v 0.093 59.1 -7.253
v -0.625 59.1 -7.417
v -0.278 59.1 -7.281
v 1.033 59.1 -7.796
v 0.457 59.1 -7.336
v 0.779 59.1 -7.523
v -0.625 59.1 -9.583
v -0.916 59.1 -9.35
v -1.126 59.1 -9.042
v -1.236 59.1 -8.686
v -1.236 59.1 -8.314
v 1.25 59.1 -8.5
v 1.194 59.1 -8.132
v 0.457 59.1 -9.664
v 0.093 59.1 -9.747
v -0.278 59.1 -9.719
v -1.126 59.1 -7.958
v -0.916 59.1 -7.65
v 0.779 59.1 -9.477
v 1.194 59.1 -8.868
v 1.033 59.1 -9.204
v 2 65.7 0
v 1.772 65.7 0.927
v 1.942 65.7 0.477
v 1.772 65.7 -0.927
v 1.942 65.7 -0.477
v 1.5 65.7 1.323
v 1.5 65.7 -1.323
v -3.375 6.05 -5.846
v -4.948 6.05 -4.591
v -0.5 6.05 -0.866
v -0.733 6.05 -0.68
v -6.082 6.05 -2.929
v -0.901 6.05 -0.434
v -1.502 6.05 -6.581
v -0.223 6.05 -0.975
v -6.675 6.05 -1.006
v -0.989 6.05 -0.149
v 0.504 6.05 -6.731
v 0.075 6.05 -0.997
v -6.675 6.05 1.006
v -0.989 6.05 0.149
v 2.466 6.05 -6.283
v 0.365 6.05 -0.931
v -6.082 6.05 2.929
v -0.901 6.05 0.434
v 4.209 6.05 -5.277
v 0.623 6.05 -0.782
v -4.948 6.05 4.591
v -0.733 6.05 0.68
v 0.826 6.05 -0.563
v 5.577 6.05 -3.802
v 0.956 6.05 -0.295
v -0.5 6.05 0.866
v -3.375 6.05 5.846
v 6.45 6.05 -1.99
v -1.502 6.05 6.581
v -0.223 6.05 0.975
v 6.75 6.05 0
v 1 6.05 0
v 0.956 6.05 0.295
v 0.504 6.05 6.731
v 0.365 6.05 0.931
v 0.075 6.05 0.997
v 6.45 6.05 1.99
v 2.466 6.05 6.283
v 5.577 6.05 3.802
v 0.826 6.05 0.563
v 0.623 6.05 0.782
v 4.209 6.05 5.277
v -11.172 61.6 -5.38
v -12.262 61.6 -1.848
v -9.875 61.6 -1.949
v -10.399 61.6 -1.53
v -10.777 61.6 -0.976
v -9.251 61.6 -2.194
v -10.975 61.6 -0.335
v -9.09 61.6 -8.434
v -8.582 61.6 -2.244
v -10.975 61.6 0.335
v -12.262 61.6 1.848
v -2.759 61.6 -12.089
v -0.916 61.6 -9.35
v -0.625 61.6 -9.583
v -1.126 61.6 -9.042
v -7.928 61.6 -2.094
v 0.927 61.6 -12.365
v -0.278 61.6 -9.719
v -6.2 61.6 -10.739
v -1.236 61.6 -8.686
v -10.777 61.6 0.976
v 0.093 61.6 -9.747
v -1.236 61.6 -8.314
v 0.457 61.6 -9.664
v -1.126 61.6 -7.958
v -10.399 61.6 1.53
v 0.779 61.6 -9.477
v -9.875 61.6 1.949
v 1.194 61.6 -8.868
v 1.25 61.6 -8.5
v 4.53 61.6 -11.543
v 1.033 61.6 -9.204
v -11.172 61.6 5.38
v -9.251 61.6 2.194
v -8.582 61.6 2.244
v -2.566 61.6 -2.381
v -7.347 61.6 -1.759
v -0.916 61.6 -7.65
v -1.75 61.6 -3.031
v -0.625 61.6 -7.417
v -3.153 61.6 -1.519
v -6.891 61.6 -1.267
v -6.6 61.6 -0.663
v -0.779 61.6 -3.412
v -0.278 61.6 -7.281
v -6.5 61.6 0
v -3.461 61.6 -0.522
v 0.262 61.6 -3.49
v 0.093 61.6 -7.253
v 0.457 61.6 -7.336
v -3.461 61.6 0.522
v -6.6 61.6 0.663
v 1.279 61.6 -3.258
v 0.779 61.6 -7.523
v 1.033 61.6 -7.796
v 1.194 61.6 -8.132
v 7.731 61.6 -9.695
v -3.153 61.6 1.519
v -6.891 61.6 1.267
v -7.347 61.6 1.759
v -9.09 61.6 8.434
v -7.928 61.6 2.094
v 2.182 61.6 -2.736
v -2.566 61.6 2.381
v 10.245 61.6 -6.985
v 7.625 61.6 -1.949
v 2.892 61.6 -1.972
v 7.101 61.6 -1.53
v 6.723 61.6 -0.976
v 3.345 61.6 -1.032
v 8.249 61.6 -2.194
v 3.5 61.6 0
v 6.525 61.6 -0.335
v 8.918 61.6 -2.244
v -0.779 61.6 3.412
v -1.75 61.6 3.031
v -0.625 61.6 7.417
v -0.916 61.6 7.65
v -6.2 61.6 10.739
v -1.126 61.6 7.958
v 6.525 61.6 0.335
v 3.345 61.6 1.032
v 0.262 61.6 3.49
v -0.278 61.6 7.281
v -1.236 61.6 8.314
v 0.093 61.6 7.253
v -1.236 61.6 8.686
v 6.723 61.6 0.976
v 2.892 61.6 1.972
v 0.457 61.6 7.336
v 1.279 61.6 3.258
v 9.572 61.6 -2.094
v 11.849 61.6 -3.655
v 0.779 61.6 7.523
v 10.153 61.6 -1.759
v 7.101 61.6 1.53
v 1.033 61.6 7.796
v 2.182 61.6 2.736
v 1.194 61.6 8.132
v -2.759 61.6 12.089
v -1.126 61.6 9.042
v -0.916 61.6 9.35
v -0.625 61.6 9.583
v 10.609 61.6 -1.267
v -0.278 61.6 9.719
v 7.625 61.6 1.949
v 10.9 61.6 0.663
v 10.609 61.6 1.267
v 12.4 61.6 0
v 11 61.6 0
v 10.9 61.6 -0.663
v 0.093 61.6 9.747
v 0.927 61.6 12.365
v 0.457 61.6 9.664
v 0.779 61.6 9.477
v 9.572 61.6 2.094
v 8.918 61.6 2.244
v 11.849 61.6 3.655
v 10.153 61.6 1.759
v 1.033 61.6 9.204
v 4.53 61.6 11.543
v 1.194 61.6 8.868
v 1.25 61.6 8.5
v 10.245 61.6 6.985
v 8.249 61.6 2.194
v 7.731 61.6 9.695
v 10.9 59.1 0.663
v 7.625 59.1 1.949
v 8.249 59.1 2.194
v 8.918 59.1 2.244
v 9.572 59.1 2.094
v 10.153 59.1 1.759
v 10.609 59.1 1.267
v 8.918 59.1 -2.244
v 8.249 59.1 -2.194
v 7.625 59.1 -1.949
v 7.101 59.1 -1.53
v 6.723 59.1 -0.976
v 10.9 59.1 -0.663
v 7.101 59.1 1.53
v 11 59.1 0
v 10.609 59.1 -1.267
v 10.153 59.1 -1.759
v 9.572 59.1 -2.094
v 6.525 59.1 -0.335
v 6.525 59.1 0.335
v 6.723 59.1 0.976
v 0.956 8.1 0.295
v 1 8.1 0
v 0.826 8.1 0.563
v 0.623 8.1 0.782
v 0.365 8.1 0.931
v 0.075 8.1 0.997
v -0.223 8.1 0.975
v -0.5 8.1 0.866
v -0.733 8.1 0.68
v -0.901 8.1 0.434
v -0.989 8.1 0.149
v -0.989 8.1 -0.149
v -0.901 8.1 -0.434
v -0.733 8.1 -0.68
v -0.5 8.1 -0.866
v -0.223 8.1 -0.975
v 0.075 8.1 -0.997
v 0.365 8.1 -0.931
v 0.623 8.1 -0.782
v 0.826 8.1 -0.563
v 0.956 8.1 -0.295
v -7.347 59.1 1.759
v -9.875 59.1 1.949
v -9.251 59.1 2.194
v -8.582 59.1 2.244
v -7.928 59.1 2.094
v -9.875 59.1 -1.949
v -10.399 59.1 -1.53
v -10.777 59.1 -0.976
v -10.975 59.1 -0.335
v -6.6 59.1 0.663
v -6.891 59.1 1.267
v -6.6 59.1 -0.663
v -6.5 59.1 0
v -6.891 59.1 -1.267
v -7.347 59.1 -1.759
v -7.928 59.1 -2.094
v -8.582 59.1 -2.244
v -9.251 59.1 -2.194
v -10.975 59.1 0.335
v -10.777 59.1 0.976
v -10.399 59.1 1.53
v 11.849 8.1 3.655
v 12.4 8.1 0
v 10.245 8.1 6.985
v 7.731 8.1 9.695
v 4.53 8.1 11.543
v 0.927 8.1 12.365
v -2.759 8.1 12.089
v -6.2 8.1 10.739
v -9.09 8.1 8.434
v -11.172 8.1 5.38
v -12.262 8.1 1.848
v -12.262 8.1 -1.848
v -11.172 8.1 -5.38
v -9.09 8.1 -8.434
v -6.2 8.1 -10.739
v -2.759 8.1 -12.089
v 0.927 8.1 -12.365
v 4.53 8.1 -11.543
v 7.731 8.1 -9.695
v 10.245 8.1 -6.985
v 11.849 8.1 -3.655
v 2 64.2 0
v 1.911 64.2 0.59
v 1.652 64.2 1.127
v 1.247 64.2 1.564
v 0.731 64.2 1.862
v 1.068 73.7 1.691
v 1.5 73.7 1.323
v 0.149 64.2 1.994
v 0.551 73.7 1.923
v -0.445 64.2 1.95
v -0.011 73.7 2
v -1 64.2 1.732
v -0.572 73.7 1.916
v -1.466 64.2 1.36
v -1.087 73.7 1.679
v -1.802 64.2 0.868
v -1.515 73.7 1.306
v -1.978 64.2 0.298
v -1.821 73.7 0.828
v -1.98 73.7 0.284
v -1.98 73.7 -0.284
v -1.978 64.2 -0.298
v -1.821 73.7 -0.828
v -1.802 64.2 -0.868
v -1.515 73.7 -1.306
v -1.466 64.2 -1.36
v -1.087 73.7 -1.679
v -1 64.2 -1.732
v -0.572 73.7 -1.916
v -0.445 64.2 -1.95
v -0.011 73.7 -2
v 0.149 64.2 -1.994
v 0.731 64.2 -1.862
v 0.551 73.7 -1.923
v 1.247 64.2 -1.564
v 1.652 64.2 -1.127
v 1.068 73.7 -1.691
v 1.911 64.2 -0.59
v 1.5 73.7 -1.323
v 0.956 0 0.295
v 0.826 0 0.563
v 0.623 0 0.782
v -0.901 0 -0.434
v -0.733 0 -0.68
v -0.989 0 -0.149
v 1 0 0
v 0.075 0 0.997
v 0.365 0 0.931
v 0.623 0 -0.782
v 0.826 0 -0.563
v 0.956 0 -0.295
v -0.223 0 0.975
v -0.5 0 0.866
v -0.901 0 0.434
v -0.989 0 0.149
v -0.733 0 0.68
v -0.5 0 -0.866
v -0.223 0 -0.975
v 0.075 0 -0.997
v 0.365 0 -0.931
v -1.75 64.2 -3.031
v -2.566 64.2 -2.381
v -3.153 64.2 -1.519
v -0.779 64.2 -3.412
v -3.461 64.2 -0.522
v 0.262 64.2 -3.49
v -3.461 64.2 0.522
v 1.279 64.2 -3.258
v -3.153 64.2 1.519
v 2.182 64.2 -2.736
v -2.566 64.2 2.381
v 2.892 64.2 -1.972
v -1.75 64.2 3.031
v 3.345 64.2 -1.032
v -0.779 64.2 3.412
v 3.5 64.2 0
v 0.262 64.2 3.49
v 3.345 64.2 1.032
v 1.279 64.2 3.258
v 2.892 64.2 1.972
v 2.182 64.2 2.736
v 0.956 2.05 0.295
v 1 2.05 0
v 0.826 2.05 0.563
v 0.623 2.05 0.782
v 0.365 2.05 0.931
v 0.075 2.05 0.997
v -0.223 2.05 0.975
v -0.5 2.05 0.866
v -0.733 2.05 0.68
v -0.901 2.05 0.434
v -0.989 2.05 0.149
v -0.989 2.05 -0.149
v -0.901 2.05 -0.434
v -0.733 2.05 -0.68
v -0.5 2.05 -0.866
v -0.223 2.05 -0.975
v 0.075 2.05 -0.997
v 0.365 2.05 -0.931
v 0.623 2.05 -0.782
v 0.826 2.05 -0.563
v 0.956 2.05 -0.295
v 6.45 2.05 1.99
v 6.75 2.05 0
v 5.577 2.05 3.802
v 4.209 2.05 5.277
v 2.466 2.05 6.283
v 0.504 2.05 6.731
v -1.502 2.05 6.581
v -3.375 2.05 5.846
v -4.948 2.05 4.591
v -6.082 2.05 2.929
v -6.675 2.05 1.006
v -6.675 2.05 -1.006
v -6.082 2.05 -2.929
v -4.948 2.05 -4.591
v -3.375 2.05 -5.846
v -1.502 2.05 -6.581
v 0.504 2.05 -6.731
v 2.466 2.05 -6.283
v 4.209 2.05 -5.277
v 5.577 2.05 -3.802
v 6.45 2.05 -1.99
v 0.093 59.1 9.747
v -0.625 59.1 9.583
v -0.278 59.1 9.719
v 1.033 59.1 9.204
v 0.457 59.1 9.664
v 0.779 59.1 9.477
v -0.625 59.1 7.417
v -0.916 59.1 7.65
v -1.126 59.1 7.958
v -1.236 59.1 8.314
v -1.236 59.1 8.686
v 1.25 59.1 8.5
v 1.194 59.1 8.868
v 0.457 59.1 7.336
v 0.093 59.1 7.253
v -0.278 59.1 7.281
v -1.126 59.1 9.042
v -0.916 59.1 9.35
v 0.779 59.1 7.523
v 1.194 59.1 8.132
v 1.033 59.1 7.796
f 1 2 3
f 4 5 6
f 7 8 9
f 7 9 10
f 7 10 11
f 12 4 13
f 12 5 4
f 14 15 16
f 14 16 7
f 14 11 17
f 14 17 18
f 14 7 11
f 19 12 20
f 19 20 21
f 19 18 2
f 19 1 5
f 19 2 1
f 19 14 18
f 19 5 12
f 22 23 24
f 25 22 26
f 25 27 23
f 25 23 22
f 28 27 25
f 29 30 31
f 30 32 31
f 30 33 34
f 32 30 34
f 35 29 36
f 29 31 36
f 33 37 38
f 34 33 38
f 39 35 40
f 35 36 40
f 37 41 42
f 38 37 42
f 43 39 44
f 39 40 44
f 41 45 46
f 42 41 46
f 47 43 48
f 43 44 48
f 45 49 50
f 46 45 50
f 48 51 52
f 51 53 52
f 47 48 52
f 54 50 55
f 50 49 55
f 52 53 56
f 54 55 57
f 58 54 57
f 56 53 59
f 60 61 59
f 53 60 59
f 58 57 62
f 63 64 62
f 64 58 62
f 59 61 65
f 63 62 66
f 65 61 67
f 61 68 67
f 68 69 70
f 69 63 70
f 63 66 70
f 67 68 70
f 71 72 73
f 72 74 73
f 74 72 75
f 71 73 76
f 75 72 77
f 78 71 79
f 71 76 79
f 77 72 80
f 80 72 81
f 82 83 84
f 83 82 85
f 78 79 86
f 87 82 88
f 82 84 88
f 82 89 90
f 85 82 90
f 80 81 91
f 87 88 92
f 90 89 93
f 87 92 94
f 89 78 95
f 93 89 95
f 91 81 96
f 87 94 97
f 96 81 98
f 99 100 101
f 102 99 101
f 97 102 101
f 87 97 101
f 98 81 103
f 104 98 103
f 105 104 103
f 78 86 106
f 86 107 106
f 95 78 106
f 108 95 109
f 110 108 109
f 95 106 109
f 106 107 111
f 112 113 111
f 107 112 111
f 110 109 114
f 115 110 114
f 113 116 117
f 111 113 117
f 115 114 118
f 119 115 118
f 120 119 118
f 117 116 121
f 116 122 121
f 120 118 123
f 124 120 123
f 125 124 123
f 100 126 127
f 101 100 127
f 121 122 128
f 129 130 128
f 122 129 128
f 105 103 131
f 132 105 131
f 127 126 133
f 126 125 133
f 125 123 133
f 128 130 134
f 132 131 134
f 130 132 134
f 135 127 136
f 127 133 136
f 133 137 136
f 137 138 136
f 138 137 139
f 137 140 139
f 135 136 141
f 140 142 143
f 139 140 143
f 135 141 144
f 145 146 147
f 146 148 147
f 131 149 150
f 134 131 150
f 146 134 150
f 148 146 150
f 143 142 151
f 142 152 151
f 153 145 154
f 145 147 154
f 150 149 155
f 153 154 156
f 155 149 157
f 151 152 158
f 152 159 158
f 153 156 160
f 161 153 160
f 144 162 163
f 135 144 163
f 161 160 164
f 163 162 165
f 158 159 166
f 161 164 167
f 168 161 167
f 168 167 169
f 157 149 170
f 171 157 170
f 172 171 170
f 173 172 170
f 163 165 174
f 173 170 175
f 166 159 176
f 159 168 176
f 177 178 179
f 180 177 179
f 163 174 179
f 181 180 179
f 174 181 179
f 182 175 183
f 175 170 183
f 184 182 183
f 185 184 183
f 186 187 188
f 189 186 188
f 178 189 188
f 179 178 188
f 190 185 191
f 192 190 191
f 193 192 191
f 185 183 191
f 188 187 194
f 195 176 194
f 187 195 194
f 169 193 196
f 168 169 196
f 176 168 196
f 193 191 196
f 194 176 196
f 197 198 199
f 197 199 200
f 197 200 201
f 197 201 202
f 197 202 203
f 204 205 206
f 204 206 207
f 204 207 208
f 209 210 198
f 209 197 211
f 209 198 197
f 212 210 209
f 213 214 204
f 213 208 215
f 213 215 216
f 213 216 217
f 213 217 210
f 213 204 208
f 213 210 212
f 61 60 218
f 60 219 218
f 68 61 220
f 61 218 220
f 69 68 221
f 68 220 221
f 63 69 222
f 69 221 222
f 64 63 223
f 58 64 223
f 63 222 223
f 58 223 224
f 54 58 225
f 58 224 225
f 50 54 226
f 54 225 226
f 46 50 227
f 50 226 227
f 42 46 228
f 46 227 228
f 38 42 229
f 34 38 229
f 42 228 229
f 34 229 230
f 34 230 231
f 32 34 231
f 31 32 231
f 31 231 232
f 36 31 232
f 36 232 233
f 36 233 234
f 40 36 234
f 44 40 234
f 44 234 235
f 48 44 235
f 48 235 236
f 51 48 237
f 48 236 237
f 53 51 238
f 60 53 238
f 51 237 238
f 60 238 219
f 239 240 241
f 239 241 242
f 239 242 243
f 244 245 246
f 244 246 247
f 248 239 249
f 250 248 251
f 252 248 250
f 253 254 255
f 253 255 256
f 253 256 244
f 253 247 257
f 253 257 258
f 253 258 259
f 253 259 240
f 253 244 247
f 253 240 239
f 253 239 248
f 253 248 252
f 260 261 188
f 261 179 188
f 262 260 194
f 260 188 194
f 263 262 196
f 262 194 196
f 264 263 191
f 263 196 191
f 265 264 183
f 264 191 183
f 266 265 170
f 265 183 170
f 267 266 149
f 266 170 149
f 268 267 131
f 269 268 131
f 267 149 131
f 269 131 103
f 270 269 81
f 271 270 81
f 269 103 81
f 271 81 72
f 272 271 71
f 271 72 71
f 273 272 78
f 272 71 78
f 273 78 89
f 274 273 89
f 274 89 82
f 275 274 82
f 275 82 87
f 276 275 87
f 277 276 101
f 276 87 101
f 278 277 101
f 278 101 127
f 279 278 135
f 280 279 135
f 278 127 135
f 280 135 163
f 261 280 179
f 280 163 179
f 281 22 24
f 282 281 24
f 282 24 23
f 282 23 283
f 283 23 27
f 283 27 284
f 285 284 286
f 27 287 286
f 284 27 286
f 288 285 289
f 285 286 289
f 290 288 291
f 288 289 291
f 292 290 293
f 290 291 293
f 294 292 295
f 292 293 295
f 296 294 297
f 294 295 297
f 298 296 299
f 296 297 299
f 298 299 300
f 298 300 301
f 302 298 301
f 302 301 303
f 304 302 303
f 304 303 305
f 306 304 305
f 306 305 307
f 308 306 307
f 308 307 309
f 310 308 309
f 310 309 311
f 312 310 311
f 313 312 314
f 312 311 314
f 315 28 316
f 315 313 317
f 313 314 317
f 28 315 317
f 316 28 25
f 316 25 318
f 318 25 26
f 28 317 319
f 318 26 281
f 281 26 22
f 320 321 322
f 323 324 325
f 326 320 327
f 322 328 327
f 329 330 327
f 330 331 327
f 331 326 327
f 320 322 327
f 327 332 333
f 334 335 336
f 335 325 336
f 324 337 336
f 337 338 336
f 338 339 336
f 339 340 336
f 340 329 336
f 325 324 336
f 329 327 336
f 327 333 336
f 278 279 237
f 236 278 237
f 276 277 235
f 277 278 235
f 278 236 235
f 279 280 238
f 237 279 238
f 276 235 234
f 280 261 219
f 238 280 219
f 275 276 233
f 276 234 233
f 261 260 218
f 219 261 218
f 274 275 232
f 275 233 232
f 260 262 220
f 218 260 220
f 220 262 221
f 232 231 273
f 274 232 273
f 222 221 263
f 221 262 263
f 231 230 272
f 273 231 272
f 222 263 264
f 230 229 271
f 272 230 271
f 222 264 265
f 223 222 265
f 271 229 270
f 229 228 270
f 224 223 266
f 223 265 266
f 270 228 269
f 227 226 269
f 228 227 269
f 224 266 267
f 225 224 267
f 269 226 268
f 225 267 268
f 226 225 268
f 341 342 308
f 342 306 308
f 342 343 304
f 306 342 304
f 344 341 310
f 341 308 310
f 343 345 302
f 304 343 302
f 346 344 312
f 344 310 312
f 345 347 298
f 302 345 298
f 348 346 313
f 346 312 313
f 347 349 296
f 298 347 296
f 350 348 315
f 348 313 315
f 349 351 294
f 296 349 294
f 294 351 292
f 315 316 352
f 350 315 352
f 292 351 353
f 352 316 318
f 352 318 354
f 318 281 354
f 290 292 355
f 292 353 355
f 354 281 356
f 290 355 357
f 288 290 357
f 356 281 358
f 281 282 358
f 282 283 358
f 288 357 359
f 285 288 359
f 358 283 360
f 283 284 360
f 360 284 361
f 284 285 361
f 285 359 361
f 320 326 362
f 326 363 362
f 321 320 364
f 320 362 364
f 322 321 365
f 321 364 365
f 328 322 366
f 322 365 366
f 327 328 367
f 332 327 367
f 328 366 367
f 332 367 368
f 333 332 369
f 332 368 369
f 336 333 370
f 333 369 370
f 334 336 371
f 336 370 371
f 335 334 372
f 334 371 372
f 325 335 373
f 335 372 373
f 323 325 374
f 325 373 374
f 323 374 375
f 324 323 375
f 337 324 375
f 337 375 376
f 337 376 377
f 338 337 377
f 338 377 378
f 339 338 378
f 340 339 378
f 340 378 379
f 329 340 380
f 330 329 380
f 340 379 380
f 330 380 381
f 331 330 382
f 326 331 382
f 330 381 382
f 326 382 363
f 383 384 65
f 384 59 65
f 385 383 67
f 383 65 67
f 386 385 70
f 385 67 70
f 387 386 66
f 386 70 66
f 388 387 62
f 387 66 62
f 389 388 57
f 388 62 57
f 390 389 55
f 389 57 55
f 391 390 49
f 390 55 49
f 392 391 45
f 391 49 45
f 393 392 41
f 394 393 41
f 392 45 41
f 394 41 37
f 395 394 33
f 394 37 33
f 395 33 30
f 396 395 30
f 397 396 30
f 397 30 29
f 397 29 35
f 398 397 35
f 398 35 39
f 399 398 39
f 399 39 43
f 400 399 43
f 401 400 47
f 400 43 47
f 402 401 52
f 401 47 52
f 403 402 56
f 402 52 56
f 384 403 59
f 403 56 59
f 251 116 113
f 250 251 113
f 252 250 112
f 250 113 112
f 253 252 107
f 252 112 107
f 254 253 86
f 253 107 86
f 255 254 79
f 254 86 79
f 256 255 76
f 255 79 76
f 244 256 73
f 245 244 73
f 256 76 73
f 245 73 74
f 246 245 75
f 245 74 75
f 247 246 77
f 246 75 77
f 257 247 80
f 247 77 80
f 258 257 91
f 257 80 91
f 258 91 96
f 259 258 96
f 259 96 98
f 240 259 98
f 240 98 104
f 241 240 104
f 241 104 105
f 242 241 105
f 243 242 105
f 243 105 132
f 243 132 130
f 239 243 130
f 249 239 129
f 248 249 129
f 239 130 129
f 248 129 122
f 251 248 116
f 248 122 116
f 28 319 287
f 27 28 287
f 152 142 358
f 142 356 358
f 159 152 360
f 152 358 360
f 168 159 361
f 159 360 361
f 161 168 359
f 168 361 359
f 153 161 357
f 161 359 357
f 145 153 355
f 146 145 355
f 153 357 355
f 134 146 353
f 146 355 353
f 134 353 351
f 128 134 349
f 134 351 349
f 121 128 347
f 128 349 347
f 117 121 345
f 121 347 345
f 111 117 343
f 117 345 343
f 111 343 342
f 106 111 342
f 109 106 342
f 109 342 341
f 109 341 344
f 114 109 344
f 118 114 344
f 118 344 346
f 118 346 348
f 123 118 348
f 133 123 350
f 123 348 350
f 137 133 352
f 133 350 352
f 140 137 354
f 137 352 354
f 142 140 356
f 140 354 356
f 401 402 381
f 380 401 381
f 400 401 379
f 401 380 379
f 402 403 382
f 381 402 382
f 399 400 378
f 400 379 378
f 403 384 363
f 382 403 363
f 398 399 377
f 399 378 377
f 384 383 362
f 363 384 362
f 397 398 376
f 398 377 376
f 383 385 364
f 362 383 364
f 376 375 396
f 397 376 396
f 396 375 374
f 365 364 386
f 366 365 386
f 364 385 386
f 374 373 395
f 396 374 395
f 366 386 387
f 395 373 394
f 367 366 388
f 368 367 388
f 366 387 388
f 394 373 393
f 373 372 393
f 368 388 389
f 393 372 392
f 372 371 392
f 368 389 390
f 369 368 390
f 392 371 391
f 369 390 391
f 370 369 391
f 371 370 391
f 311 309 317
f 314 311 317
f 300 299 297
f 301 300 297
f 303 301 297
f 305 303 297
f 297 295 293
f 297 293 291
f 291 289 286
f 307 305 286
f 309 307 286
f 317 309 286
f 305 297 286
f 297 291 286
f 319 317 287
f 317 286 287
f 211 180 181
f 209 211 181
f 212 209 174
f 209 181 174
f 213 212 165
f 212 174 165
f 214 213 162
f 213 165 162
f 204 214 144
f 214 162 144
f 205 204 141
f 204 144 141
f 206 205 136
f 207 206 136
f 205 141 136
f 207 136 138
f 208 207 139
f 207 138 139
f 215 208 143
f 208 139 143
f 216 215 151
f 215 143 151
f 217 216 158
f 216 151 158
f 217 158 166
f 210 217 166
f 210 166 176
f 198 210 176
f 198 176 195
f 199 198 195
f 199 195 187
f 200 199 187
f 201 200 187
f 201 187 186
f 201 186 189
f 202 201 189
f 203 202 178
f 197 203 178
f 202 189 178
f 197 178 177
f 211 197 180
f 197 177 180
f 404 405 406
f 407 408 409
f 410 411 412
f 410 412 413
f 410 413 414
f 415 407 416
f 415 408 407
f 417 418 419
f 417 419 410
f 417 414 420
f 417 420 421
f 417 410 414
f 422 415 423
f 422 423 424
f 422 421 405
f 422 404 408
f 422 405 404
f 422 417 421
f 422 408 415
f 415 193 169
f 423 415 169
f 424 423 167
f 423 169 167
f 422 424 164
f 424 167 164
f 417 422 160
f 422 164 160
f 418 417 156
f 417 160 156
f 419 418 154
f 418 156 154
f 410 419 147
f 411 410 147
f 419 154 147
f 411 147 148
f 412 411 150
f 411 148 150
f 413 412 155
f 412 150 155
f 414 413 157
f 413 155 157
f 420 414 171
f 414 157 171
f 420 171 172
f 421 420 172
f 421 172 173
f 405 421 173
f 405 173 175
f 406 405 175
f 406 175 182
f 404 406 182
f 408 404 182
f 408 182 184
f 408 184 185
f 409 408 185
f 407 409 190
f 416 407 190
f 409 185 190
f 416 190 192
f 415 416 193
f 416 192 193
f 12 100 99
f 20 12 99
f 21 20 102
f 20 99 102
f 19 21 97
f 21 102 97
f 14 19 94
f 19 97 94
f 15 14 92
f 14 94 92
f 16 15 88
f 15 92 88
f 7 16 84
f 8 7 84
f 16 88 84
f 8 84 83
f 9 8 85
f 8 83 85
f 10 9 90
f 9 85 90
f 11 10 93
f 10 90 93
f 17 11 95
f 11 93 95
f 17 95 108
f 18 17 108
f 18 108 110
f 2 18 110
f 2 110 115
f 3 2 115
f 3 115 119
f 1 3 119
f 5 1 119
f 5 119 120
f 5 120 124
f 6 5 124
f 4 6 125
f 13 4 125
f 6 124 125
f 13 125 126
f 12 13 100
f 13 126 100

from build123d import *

# Parameters (mm, degrees)
CROQUIS3_R            = 2.25
CROQUIS3_R_2          = 1.25
CORTAR_EXTRUIR1_DEPTH = 2.5
CORTAR_EXTRUIR2_DEPTH = 8


with BuildPart() as part:
    # Croquis2 → Revolución1 (revolve)
    with BuildSketch(Plane.XY):
        Polygon((0, 0), (1, 0), (1, 2.05), (6.75, 2.05), (6.75, 6.05), (1, 6.05), (1, 8.1), (12.4, 8.1), (12.4, 61.6), (3.5, 61.6), (3.5, 64.2), (2, 64.2), (2, 73.7), (0, 73.7), align=None)
    revolve(axis=Axis((0, 73.7, 0), (0, -1, 0)))

    # Croquis3 → Cortar-Extruir1 (cut)
    with BuildSketch(Plane(origin=(0, 61.6, 0), x_dir=(1, 0, 0), z_dir=(0, 1, 0))):
        with Locations((8.75, 0)):
            Circle(CROQUIS3_R)
        with Locations((-8.75, 0)):
            Circle(CROQUIS3_R)
        with Locations((0, 8.5)):
            Circle(CROQUIS3_R_2)
        with Locations((0, -8.5)):
            Circle(CROQUIS3_R_2)
    extrude(amount=-CORTAR_EXTRUIR1_DEPTH, mode=Mode.SUBTRACT)

    # Croquis4 → Cortar-Extruir2 (cut)
    with BuildSketch(Plane(origin=(0, 73.7, 0), x_dir=(1, 0, 0), z_dir=(0, 1, 0))):
        Polygon((1.5, 50.388324137), (1.5, 1.322875656), (1.5, -1.322875656), (1.5, -50.388324137), (99.630896962, -50.388324137), (99.630896962, 50.388324137), align=None)
    extrude(amount=-CORTAR_EXTRUIR2_DEPTH, mode=Mode.SUBTRACT)


solid = part.part
